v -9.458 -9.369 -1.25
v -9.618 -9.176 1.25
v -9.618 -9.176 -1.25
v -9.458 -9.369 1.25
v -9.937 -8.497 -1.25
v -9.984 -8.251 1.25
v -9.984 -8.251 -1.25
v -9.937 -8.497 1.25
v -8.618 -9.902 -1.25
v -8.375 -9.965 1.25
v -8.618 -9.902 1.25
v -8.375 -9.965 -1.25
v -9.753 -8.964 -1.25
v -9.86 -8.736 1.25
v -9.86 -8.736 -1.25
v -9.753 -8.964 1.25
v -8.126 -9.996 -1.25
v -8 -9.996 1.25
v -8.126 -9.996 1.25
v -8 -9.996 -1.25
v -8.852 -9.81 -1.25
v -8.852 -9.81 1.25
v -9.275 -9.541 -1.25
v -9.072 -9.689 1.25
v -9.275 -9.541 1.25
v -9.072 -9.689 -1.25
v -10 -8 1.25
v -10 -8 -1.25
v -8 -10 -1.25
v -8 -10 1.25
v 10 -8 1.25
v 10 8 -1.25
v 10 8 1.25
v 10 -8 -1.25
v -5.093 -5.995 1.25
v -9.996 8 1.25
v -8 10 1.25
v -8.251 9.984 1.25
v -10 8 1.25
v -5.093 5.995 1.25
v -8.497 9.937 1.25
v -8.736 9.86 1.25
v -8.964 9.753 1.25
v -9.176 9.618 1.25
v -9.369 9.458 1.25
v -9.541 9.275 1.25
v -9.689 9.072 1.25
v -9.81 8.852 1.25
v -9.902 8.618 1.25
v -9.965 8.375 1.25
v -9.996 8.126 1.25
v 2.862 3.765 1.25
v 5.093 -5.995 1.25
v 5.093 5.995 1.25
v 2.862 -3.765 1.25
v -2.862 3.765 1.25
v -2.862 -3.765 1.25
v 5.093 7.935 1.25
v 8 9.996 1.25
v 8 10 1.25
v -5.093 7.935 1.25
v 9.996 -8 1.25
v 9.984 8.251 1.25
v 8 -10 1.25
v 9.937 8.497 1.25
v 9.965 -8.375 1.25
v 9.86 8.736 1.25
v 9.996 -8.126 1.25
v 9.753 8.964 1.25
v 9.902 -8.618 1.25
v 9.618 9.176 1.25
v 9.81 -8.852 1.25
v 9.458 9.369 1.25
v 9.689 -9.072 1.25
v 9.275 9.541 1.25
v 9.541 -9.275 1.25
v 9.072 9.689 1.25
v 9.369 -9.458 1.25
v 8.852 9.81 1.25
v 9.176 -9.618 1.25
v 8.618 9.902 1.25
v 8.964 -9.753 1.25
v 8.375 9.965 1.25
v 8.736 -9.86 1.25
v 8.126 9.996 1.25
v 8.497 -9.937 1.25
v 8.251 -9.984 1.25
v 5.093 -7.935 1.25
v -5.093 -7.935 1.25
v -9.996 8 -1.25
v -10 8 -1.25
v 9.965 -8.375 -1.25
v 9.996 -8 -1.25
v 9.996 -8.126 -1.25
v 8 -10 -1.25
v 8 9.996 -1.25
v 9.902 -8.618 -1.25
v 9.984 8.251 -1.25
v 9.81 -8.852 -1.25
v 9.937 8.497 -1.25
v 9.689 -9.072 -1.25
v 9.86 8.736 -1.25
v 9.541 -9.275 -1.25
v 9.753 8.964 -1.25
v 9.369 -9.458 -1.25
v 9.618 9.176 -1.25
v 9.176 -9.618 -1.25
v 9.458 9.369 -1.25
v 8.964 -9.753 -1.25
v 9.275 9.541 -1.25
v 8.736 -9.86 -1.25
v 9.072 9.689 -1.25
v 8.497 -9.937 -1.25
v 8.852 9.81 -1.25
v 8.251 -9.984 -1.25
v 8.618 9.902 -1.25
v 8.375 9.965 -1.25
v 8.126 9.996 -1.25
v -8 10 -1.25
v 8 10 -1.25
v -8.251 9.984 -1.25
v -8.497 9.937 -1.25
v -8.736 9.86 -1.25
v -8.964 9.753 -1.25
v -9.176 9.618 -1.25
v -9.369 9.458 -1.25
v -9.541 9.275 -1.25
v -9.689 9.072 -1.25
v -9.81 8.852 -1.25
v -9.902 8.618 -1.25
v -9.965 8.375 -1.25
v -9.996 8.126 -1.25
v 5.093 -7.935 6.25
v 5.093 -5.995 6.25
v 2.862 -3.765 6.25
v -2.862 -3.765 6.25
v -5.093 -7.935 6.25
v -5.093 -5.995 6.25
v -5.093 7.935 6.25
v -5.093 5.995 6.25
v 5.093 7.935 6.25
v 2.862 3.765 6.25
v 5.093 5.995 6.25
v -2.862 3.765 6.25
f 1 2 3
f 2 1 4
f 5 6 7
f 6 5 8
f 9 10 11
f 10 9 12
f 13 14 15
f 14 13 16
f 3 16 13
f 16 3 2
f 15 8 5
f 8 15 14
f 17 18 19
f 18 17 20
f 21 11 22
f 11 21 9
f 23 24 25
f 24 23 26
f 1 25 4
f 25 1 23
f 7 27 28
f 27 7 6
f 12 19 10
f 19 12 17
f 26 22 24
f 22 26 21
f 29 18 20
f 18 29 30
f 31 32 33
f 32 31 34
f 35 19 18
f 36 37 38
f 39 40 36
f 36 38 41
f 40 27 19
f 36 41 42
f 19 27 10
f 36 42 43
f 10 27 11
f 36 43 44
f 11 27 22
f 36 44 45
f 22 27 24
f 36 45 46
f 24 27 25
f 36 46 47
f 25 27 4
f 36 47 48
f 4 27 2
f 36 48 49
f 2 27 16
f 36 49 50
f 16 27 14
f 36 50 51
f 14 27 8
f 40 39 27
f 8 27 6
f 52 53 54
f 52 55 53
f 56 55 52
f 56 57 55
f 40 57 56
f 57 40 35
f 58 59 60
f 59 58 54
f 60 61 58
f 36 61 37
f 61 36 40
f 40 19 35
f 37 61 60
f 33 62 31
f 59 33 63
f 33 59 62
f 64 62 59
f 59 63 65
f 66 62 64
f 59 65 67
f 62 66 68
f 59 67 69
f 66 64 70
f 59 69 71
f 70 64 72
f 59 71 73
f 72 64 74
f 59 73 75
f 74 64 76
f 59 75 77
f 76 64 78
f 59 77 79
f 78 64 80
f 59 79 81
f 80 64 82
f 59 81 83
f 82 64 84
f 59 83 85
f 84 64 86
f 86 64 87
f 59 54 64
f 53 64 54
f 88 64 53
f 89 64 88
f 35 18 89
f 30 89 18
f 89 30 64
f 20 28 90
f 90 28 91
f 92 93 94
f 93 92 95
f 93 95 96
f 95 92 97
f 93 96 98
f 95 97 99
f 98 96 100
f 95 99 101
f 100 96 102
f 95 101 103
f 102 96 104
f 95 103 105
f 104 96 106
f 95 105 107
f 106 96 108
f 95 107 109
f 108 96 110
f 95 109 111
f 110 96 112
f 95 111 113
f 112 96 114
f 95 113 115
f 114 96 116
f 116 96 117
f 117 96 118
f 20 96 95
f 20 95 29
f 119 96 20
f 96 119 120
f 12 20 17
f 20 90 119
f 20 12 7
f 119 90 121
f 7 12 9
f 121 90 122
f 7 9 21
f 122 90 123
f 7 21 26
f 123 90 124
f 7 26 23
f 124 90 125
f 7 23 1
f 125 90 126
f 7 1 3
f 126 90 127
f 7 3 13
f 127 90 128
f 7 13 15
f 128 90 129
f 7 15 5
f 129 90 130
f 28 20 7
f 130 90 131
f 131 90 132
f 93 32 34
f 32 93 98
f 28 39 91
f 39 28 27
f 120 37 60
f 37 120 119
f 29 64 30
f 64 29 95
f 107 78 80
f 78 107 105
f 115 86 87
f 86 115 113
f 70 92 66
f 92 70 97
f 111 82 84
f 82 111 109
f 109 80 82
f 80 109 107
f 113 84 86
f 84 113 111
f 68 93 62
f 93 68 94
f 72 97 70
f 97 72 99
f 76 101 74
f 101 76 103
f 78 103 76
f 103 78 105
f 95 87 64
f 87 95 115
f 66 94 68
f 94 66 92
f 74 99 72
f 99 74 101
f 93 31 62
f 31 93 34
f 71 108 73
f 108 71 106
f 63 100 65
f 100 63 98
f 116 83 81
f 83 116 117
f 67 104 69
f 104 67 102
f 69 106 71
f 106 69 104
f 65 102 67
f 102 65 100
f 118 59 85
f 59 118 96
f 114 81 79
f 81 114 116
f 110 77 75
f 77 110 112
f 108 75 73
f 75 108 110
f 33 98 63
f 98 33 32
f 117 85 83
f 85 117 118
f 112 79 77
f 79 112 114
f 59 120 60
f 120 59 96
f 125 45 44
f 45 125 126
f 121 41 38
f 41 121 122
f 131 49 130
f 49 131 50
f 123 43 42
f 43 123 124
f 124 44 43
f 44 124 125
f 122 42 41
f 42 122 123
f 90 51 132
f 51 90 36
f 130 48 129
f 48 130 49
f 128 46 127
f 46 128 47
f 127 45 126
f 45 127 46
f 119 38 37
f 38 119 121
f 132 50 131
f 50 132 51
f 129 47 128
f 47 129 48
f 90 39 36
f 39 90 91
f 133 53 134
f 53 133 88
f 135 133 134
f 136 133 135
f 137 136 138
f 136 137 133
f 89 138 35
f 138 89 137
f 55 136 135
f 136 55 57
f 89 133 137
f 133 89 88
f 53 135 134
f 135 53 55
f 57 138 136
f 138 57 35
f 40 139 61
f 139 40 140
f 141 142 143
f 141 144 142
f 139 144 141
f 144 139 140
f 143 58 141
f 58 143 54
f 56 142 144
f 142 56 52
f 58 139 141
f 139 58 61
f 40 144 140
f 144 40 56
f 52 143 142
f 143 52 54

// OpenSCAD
$fn=50;

snugness_factor=0.97;

makefeet();

module makefeet()
{
  union()
  {
    translate([0,0,0]) roundedbox(20,20,2.5,2);
   // translate([0,0,(11/2)+1.25-1]) cylinder(11,4.6/2,4.6/2,center=true); // Rod for central 5mm dia hole
    translate([0,-(10-4.15),((11/2)+1.25)-1]) rotate([0,0,0]) makesideinsert(5);
    translate([0,10-4.15,((11/2)+1.25)-1]) rotate([0,0,180]) makesideinsert(5);
  }
}

module makesideinsert(len)
{
  translate([0,0,-len/2])
  scale([snugness_factor,snugness_factor,1])
  {
    difference()
    {
      cube([10.5,4.3,len+1],center=true);
      translate([(10.5/2)+((4/1.414)/2),(4.3/2)+((4/1.414)/2)-2.3,0]) rotate([0,0,45]) cube([4,10,len+2],center=true);
      translate([-((10.5/2)+((4/1.414)/2)),(4.3/2)+((4/1.414)/2)-2.3,0]) rotate([0,0,-45]) cube([4,10,len+2],center=true);
    }
  }
}

module roundedbox(l,d,h,r)
{
  difference()
  {
    difference()
    {
      difference()
      {
        difference()
        {
          cube([l,d,h],center=true);
          translate([-(l/2)+r,-(d/2)+r,0]){corner(r,h,0);};
        }
        translate([(l/2)-r,-(d/2)+r,0]){corner(r,h,90);};
      }
      translate([(l/2)-r,(d/2)-r,0]){corner(r,h,180);};
    }
    translate([-(l/2)+r,(d/2)-r,0]){corner(r,h,270);};
  }
}

module corner(r,h,ang)
{
  rotate([0,0,ang])
  {
    difference()
    {
      difference()
      {
        difference()
        {
          cylinder(h*2,r*2,r*2,center=true);
          cylinder(h*2,r,r,center=true);
        }
        translate([r*5,0,0]){cube([r*10,r*10,h*2],center=true);}
      }
      translate([0,r*5,0]){cube([r*10,r*10,h*2],center=true);}
    }
  }
}
